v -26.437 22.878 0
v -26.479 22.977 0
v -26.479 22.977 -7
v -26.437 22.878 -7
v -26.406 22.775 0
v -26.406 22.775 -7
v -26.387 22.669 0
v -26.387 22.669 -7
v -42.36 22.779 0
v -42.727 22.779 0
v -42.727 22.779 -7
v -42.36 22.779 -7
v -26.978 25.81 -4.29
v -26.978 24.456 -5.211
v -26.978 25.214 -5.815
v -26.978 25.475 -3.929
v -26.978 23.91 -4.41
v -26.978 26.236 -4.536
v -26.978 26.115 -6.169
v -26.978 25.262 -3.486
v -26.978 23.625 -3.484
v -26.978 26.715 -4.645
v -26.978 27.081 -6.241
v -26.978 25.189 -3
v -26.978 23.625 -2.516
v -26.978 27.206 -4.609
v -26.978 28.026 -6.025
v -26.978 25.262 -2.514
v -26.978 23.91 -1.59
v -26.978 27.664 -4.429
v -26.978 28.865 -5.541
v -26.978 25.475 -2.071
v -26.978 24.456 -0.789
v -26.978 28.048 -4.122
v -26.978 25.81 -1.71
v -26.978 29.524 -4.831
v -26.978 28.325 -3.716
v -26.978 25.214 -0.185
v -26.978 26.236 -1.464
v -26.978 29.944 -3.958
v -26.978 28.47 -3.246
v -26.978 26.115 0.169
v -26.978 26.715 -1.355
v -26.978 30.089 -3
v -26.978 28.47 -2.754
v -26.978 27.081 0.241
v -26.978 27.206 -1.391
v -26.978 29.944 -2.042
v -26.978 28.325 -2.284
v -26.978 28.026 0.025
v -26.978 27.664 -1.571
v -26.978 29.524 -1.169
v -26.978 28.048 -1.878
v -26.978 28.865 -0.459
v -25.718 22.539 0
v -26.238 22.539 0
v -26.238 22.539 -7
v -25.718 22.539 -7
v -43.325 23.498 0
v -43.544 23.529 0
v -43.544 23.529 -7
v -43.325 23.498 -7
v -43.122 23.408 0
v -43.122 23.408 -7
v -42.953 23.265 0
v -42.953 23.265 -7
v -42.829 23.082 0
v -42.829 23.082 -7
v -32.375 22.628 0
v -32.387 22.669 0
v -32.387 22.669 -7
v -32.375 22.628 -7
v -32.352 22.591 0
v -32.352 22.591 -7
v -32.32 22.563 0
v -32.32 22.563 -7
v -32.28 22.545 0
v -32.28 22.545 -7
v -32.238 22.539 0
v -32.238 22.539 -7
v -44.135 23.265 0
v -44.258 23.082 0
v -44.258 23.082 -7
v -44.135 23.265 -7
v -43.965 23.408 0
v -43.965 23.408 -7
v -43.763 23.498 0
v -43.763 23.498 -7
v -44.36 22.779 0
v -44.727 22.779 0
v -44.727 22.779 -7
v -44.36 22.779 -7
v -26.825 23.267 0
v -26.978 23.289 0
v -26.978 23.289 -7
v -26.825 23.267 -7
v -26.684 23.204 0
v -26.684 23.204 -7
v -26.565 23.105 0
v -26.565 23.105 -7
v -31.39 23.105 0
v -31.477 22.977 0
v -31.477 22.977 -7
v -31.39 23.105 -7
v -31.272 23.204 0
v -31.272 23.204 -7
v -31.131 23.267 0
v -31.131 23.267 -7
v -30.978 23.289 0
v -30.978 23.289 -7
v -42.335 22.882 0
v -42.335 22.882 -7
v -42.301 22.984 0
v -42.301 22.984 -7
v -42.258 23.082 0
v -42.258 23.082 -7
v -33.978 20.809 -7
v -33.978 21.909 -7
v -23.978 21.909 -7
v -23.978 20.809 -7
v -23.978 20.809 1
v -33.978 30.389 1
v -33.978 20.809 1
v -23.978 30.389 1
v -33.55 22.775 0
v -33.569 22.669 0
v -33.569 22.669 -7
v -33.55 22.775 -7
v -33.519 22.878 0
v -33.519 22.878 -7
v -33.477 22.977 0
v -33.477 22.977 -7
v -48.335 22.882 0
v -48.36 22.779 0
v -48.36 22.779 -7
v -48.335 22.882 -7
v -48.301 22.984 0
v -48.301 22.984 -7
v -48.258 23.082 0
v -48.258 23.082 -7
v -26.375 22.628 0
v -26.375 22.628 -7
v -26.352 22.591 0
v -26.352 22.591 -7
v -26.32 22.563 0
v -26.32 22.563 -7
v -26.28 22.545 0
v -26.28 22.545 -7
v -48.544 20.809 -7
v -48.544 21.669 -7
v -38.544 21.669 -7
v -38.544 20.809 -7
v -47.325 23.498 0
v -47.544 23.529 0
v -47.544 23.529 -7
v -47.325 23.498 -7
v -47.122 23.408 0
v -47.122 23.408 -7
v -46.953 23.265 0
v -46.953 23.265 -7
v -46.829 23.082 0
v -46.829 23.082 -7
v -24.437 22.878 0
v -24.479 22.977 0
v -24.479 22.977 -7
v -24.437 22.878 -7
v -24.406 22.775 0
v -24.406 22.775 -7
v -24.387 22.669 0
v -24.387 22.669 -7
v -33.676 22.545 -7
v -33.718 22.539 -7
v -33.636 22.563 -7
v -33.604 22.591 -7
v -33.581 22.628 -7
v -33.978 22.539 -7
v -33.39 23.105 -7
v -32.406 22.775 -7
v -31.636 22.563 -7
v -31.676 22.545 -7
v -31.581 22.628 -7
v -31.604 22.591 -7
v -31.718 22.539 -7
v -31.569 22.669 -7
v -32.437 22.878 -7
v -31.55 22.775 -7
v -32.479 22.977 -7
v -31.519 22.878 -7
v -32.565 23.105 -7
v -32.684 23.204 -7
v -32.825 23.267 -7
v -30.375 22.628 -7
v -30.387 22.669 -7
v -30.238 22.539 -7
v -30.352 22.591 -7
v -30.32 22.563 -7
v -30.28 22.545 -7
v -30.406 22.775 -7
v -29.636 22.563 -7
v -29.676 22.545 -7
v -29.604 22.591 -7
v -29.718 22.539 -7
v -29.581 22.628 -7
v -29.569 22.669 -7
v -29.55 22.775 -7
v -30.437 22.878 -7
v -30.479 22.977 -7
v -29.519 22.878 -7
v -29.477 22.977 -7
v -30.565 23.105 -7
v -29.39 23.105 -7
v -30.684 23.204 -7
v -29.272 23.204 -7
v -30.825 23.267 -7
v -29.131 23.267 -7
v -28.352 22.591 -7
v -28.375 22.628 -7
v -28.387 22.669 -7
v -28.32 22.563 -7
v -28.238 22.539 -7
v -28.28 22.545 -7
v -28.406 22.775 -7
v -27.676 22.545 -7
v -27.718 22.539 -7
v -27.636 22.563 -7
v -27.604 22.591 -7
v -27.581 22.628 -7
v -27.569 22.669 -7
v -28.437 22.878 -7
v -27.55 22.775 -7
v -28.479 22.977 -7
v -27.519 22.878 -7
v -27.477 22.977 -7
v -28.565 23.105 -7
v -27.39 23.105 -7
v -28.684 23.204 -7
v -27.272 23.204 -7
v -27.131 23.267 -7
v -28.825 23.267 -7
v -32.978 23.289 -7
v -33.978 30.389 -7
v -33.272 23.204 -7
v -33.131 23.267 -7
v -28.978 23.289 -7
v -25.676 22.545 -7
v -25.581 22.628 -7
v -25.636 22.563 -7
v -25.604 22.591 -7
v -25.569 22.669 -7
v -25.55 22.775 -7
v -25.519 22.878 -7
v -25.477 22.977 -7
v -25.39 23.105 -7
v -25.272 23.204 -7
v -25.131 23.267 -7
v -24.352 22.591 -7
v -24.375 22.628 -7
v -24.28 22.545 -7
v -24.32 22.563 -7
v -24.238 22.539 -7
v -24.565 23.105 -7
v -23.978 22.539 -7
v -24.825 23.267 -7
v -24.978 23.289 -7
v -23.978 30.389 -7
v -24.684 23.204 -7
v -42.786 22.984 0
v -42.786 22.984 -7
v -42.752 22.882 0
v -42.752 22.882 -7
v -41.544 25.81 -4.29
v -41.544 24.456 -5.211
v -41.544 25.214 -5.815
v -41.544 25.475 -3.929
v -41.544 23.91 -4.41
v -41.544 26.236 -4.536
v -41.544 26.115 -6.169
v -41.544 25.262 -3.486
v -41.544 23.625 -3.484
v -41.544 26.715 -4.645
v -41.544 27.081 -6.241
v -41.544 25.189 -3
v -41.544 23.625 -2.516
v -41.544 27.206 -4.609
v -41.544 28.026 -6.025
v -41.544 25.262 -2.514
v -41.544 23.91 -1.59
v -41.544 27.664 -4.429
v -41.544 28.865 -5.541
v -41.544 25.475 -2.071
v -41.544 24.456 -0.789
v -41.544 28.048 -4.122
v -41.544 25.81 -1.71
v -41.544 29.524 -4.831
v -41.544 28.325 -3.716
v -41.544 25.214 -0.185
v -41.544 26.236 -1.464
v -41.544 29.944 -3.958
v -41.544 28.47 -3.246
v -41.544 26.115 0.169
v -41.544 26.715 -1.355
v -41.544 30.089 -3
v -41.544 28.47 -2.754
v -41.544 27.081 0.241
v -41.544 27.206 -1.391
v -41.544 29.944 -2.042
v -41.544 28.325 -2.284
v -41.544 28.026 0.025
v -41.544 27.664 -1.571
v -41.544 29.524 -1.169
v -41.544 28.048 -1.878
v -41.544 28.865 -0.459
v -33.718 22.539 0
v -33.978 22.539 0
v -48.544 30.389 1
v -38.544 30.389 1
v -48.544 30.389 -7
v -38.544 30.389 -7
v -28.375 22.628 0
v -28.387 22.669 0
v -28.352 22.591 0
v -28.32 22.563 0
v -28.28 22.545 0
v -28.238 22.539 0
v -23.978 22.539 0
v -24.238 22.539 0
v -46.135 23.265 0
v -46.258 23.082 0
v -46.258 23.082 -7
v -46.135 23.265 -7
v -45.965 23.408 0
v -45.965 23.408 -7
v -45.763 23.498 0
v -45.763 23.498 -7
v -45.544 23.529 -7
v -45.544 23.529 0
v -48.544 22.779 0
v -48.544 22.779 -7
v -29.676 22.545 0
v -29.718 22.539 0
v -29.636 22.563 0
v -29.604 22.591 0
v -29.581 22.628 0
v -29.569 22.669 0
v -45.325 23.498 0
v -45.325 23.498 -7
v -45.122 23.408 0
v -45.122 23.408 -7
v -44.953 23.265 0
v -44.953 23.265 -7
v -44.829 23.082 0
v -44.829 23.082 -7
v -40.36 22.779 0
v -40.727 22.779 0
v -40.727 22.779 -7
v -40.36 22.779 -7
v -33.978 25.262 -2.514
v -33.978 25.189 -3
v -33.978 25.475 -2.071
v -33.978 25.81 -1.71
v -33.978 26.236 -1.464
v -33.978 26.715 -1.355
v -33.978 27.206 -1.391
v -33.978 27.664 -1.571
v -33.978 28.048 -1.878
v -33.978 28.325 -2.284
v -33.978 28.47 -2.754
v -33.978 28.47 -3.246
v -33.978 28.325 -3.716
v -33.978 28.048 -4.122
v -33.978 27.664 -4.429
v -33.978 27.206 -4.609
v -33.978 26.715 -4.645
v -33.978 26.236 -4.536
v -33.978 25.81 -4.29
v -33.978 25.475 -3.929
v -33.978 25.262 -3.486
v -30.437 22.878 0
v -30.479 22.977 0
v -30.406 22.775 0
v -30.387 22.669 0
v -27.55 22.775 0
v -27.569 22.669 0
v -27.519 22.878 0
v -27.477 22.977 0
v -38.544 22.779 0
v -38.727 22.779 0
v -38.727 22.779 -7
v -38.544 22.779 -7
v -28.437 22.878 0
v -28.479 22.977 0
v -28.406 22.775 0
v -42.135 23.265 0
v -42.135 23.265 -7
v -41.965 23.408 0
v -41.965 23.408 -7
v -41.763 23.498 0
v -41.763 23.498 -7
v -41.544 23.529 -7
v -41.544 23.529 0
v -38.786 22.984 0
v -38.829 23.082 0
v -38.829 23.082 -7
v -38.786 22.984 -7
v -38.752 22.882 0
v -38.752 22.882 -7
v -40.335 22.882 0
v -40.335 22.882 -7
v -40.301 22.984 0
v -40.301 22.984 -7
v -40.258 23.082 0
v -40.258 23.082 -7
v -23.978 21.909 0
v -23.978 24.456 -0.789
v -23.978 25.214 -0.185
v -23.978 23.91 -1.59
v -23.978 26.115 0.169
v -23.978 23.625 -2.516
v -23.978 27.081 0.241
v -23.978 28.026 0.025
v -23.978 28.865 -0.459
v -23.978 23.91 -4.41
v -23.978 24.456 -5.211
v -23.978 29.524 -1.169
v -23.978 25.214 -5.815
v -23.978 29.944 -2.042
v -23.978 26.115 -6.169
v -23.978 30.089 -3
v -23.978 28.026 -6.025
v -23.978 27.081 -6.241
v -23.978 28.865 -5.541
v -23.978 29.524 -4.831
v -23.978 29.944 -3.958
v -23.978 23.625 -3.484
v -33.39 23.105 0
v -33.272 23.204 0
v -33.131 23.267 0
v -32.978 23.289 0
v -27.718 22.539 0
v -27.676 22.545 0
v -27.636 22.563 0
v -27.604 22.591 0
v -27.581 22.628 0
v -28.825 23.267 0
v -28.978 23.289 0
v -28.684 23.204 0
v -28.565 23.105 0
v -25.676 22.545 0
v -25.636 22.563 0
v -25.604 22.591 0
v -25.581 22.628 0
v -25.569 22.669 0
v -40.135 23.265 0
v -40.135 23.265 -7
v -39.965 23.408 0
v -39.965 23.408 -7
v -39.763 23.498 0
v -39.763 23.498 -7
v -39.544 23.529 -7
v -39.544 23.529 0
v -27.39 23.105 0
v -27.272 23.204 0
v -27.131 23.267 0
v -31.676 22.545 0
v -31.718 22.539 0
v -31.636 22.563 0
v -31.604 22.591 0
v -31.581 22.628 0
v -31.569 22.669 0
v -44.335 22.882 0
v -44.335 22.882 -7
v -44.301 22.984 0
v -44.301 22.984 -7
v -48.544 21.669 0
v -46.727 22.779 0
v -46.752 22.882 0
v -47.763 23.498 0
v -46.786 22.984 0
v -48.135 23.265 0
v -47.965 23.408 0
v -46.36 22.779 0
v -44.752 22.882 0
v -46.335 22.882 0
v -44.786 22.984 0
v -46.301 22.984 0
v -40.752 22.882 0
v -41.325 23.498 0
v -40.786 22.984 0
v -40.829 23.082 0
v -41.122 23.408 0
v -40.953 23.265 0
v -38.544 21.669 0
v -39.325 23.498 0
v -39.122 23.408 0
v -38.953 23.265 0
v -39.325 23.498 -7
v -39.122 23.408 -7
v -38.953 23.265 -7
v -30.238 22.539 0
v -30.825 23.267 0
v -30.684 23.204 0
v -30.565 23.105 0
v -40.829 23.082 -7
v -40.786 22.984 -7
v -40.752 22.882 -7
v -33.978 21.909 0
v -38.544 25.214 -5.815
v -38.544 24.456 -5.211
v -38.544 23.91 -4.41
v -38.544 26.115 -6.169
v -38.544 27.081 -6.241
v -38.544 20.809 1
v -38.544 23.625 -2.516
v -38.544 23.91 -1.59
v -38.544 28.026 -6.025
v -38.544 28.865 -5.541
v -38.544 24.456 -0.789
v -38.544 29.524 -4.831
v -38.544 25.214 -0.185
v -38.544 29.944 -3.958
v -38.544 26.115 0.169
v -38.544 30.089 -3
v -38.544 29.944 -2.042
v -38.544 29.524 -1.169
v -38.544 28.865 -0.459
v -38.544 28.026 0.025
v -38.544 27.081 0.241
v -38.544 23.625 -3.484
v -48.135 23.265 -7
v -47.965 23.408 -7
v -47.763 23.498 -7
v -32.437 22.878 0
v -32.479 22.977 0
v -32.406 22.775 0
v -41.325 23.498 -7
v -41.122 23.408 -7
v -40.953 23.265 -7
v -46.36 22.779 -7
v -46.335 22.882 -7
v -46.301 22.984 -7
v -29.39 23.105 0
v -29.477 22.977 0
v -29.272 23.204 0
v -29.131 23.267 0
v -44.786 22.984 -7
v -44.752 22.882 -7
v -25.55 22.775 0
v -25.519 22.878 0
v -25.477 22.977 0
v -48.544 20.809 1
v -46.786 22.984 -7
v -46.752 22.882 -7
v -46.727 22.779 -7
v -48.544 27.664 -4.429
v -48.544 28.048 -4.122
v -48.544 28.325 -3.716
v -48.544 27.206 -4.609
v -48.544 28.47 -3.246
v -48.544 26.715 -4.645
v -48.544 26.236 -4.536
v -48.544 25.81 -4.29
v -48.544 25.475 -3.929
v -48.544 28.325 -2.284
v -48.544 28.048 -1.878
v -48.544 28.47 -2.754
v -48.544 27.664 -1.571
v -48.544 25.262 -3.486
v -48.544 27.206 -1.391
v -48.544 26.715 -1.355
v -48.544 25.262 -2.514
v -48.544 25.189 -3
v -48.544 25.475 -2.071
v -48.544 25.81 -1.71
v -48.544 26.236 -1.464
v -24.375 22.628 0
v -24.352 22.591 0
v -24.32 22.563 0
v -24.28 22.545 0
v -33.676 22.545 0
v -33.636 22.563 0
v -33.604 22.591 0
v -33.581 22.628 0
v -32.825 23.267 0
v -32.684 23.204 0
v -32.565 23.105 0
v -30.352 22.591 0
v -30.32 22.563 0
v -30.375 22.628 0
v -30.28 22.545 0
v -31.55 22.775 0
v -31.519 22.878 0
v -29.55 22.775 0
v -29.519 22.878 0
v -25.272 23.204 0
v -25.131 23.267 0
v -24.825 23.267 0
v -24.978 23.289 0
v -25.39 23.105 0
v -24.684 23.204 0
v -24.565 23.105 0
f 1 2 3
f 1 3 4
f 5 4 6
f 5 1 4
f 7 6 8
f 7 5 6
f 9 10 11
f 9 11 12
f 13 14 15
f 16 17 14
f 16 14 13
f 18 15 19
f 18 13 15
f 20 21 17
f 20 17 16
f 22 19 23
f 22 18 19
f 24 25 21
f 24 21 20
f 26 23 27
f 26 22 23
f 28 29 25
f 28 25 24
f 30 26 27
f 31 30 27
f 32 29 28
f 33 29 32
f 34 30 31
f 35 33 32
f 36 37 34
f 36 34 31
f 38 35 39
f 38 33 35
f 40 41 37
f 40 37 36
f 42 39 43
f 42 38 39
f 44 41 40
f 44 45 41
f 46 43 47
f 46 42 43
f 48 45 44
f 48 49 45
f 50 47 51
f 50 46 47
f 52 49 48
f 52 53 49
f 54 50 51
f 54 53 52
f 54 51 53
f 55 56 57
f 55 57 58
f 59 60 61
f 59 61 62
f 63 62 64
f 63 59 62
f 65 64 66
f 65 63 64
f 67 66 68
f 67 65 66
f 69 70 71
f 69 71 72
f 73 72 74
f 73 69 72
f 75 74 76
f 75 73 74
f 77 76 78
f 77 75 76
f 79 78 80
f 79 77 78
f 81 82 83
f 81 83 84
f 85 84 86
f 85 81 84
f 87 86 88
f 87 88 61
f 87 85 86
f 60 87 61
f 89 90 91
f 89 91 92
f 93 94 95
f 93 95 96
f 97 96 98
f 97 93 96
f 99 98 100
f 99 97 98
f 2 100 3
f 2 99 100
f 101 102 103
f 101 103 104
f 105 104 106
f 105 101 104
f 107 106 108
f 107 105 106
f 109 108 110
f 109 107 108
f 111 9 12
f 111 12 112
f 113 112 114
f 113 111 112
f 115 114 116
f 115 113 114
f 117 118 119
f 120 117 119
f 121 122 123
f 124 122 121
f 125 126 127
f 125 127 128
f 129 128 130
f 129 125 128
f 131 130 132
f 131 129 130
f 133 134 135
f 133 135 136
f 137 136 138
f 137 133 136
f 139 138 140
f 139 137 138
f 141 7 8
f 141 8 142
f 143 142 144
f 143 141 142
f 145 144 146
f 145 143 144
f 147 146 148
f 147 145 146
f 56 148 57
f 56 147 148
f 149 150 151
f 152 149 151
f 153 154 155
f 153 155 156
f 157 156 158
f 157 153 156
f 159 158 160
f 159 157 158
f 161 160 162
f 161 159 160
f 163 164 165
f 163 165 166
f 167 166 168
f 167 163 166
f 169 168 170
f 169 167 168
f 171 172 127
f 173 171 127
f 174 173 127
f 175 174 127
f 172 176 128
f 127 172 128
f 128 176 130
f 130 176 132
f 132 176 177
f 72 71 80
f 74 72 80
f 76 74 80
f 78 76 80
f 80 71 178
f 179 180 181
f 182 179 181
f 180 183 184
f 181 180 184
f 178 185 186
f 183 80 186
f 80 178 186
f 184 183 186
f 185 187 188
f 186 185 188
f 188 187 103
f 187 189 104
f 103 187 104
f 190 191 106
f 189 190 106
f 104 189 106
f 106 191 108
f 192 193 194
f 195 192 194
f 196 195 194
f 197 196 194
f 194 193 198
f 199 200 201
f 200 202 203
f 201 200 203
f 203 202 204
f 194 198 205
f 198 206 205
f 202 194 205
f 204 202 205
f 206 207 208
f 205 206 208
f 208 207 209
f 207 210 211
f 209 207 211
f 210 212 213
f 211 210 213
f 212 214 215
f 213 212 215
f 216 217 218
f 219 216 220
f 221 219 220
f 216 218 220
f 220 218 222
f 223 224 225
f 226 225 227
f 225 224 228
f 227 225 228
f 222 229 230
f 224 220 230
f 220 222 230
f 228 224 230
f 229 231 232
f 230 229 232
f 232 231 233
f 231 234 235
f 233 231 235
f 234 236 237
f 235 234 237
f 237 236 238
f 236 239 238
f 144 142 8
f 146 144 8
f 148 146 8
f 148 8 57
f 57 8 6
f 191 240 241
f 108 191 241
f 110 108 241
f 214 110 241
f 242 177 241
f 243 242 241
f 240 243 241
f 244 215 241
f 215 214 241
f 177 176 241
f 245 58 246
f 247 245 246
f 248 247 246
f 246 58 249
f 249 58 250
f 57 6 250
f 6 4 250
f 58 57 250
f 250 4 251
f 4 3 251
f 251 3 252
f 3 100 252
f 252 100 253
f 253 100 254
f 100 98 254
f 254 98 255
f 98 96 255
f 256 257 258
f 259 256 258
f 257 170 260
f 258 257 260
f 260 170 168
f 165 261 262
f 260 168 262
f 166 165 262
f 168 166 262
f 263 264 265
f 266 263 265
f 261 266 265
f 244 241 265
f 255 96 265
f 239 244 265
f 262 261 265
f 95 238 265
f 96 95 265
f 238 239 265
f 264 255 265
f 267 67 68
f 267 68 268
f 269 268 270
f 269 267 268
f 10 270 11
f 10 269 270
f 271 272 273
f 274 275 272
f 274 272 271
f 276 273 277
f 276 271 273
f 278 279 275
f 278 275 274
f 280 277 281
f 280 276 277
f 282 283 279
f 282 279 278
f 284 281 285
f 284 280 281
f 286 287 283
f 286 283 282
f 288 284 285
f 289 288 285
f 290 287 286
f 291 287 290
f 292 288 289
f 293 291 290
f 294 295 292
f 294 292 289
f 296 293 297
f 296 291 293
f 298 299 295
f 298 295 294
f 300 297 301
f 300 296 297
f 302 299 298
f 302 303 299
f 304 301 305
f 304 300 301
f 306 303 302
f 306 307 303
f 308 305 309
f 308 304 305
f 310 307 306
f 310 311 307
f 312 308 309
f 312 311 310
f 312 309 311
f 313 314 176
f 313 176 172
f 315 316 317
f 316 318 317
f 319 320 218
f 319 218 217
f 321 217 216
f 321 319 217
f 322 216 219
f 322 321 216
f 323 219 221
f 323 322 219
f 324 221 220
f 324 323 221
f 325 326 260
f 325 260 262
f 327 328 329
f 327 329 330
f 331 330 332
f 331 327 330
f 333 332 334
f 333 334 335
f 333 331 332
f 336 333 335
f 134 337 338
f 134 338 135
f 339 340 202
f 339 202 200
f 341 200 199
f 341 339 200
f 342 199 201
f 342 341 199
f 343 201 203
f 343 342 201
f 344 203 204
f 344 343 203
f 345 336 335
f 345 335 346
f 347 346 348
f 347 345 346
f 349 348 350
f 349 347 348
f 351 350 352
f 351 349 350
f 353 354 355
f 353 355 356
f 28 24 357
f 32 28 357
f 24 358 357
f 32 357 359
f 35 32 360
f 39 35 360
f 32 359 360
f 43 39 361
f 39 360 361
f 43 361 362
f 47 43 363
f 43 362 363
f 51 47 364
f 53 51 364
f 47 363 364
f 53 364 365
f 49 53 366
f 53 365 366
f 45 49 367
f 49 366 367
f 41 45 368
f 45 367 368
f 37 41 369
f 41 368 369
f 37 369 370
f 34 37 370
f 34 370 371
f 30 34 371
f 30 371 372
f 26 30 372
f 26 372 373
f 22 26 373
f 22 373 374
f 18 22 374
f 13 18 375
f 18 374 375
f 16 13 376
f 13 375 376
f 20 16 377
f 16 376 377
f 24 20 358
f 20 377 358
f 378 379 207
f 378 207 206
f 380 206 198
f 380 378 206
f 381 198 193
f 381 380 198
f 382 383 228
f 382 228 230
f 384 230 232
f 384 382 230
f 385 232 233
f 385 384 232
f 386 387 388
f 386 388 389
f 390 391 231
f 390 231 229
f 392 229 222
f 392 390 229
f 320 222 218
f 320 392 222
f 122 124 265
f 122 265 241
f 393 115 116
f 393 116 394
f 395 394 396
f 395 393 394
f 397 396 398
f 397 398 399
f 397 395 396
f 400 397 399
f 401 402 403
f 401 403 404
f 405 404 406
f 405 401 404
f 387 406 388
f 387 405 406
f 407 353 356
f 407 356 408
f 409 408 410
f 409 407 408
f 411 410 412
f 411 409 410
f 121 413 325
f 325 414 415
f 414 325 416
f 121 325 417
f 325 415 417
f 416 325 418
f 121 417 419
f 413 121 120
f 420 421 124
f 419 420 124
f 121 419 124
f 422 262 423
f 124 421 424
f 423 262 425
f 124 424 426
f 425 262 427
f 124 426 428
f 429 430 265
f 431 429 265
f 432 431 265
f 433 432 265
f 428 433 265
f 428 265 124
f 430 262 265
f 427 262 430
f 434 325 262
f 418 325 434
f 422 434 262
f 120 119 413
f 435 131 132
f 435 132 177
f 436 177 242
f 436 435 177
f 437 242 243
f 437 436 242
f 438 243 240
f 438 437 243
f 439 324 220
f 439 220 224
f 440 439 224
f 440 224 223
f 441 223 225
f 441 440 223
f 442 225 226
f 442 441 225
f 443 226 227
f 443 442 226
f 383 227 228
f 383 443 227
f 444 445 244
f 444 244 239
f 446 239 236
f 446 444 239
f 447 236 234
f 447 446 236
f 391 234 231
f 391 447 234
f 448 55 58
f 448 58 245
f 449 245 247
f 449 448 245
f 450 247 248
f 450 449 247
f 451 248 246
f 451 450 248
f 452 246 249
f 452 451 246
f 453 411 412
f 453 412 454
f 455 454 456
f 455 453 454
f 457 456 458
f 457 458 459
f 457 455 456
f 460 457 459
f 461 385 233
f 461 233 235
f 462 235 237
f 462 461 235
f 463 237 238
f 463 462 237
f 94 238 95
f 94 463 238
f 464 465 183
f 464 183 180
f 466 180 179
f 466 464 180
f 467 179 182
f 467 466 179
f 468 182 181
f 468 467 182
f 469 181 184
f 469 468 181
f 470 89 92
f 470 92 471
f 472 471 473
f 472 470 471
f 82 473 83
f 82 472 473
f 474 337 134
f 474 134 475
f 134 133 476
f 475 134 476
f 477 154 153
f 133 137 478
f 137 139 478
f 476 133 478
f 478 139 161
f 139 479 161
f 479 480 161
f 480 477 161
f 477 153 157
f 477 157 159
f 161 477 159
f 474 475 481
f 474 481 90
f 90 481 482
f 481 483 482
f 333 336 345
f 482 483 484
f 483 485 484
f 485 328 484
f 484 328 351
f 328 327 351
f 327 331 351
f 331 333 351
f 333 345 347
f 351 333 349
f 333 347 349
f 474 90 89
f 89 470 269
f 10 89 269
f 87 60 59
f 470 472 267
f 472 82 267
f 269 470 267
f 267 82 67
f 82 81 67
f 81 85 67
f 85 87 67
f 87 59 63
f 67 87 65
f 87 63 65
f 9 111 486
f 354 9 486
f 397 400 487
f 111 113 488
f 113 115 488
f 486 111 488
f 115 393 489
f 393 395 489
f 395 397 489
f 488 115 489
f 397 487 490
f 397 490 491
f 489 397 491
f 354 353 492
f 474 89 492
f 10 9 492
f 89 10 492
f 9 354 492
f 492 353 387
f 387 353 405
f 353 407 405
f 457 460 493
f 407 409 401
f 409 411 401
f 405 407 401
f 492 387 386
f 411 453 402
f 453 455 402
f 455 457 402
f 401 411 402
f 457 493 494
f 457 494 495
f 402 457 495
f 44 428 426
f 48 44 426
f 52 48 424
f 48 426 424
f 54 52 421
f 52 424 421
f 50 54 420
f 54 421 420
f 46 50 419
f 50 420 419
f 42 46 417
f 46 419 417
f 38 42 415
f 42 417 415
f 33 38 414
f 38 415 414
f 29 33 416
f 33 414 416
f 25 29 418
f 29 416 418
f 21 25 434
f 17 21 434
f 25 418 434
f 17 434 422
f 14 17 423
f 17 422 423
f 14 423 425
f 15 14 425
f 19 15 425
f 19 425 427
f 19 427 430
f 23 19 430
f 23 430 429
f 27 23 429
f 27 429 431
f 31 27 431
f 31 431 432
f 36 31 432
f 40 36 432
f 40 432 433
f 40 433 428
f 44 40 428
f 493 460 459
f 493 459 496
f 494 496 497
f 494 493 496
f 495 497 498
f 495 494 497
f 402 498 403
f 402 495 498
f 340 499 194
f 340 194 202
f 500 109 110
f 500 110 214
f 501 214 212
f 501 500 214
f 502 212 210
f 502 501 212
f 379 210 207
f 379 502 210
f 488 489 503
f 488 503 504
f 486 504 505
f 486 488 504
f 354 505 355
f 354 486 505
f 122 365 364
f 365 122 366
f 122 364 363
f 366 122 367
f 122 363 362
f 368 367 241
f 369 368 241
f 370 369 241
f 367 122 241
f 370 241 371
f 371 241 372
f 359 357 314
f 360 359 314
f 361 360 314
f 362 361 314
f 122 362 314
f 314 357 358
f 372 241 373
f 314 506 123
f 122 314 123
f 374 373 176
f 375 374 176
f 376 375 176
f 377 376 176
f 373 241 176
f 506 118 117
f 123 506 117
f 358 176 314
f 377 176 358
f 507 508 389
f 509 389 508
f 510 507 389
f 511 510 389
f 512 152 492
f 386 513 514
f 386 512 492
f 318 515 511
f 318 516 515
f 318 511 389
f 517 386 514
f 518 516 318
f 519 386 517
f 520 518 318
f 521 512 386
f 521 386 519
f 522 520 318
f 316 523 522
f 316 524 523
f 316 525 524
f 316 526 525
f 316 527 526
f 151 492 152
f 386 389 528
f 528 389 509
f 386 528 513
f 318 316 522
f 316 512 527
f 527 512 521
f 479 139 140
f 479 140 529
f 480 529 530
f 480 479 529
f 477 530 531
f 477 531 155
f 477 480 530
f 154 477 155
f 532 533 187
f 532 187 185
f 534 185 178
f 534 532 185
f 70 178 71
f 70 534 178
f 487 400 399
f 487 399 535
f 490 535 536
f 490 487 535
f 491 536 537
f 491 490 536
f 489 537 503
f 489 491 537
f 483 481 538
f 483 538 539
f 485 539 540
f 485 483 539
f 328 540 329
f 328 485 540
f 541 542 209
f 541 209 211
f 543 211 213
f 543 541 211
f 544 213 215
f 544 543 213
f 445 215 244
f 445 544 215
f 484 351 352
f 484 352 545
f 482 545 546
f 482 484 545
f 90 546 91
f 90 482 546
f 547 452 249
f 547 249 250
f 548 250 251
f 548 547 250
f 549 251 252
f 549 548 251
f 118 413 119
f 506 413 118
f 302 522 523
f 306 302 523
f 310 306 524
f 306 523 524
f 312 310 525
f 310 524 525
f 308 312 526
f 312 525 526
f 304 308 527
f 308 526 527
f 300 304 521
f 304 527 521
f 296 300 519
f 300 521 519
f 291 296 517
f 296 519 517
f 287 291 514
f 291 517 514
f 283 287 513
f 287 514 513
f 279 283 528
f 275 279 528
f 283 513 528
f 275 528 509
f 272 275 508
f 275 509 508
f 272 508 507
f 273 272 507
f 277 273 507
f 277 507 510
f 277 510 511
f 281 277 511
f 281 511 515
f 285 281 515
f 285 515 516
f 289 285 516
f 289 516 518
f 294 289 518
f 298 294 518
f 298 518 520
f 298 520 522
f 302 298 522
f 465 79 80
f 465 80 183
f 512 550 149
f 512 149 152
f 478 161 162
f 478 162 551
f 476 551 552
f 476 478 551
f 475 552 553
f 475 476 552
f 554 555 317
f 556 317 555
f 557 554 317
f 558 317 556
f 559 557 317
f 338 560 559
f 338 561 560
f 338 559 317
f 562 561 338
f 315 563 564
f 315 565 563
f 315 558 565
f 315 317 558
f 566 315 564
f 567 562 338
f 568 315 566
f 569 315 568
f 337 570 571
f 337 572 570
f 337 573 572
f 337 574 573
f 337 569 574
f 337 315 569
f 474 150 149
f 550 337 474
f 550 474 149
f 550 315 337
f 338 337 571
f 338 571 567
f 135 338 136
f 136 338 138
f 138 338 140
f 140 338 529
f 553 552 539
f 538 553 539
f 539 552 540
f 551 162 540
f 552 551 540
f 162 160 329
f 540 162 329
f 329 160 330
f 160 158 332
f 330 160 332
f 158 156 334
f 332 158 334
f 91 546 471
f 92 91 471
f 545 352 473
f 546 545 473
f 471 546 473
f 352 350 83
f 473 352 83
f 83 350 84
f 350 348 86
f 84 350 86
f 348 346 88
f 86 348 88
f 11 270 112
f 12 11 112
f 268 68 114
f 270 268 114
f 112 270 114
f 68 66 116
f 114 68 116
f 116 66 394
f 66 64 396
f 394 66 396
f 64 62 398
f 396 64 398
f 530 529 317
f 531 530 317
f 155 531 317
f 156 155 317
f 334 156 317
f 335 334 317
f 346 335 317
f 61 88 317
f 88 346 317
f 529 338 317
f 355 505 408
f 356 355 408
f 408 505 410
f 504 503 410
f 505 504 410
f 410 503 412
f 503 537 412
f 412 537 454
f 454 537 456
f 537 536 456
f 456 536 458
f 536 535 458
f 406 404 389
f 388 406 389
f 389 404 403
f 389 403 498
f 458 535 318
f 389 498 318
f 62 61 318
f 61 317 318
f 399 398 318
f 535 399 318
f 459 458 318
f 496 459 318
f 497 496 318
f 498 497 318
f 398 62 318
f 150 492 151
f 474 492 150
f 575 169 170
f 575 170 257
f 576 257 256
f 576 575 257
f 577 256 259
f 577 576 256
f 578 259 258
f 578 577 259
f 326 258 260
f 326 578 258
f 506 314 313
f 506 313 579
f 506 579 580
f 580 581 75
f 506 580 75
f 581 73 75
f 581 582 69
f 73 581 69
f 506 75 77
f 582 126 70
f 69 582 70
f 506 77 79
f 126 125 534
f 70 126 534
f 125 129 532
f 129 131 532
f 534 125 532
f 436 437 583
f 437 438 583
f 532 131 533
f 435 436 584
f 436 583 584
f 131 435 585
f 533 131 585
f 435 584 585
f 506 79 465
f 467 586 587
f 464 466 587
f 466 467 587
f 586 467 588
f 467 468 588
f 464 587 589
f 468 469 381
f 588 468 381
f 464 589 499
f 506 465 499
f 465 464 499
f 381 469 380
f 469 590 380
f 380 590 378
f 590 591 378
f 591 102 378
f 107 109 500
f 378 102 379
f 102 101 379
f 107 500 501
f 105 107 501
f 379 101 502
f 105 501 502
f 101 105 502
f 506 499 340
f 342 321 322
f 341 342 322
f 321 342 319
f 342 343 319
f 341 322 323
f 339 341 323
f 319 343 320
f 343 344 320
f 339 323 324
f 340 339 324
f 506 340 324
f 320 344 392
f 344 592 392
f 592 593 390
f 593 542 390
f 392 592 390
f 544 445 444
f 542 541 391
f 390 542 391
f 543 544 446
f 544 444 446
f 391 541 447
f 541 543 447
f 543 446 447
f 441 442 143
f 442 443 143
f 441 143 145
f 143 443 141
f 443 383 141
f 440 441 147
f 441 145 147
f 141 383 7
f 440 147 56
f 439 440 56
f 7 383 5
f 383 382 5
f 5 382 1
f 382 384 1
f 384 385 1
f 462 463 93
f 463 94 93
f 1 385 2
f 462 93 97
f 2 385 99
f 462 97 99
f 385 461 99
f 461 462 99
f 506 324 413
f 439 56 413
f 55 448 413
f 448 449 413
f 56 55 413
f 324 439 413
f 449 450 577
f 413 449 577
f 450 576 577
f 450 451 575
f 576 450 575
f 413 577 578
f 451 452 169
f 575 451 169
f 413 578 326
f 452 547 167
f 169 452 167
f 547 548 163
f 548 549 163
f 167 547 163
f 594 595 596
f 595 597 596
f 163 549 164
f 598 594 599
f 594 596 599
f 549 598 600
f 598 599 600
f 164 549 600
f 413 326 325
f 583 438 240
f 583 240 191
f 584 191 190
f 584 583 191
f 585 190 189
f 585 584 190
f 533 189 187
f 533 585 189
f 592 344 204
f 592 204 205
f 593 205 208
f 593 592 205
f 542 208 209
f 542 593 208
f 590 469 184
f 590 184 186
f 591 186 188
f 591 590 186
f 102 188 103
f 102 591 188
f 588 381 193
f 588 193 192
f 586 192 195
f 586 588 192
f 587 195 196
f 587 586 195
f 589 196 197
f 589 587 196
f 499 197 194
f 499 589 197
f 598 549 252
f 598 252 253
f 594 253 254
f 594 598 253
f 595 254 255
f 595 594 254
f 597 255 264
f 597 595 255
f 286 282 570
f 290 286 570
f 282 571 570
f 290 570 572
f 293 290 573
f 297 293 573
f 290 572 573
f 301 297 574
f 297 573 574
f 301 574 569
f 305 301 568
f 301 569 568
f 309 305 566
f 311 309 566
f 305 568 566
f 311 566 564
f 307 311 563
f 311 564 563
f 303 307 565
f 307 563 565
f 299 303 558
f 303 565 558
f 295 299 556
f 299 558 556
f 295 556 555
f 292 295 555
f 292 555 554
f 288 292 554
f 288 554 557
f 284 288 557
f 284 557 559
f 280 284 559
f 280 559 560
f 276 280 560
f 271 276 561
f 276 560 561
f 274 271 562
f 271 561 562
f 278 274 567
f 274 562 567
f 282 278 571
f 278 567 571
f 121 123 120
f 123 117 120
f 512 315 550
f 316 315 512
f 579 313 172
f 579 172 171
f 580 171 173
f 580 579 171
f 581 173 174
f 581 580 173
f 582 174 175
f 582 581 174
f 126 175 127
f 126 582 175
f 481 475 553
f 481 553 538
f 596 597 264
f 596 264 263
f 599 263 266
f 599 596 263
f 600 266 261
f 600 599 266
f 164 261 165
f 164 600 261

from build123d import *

# Parameters (mm, degrees)
F1_DEPTH       = 1
F2_DEPTH       = 7
F4_D           = 3.3
F4_CBORE_D     = 6.5
F4_CBORE_DEPTH = 3
F6_D           = 3.3
F6_CBORE_D     = 6.5
F6_CBORE_DEPTH = 3


# Not quite as in the source:
# - a feature names something its author has since deleted; it is built from what else it names


with BuildPart() as f1:
    # F0 (on Top) → F1 (new body)
    with BuildSketch(Plane.XY):
        with BuildLine():
            ThreePointArc((-32.9779816215, 23.288556752), (-32.6838322098, 23.2041958107), (-32.479105217, 22.9767589991))
            ThreePointArc((-32.479105217, 22.9767589991), (-32.4203699072, 22.8266189059), (-32.3865247301, 22.6689915346))
            ThreePointArc((-32.3865247301, 22.6689915346), (-32.3367132674, 22.5757853402), (-32.2378061964, 22.538556752))
            Line((-32.2378061964, 22.538556752), (-31.9779816215, 22.538556752))
            Line((-31.9779816215, 22.538556752), (-31.7181570466, 22.538556752))
            ThreePointArc((-31.7181570466, 22.538556752), (-31.6192499756, 22.5757853402), (-31.5694385129, 22.6689915346))
            ThreePointArc((-31.5694385129, 22.6689915346), (-31.5355933359, 22.8266189059), (-31.476858026, 22.9767589991))
            ThreePointArc((-31.476858026, 22.9767589991), (-31.2721310332, 23.2041958107), (-30.9779816215, 23.288556752))
            ThreePointArc((-30.9779816215, 23.288556752), (-30.6838322098, 23.2041958107), (-30.479105217, 22.9767589991))
            ThreePointArc((-30.479105217, 22.9767589991), (-30.4203699072, 22.8266189059), (-30.3865247301, 22.6689915346))
            ThreePointArc((-30.3865247301, 22.6689915346), (-30.3367132674, 22.5757853402), (-30.2378061964, 22.538556752))
            Line((-30.2378061964, 22.538556752), (-29.9779816215, 22.538556752))
            Line((-29.9779816215, 22.538556752), (-29.7181570466, 22.538556752))
            ThreePointArc((-29.7181570466, 22.538556752), (-29.6192499756, 22.5757853402), (-29.5694385129, 22.6689915346))
            ThreePointArc((-29.5694385129, 22.6689915346), (-29.5355933359, 22.8266189059), (-29.476858026, 22.9767589991))
            ThreePointArc((-29.476858026, 22.9767589991), (-29.2721310332, 23.2041958107), (-28.9779816215, 23.288556752))
            ThreePointArc((-28.9779816215, 23.288556752), (-28.6838322098, 23.2041958107), (-28.479105217, 22.9767589991))
            ThreePointArc((-28.479105217, 22.9767589991), (-28.4203699072, 22.8266189059), (-28.3865247301, 22.6689915346))
            ThreePointArc((-28.3865247301, 22.6689915346), (-28.3367132674, 22.5757853402), (-28.2378061964, 22.538556752))
            Line((-28.2378061964, 22.538556752), (-27.9779816215, 22.538556752))
            Line((-27.9779816215, 22.538556752), (-27.7181570466, 22.538556752))
            ThreePointArc((-27.7181570466, 22.538556752), (-27.6192499756, 22.5757853402), (-27.5694385129, 22.6689915346))
            ThreePointArc((-27.5694385129, 22.6689915346), (-27.5355933359, 22.8266189059), (-27.476858026, 22.9767589991))
            ThreePointArc((-27.476858026, 22.9767589991), (-27.2721310332, 23.2041958107), (-26.9779816215, 23.288556752))
            ThreePointArc((-26.9779816215, 23.288556752), (-26.6838322098, 23.2041958107), (-26.479105217, 22.9767589991))
            ThreePointArc((-26.479105217, 22.9767589991), (-26.4203699072, 22.8266189059), (-26.3865247301, 22.6689915346))
            ThreePointArc((-26.3865247301, 22.6689915346), (-26.3367132674, 22.5757853402), (-26.2378061964, 22.538556752))
            Line((-26.2378061964, 22.538556752), (-25.9779816215, 22.538556752))
            Line((-25.9779816215, 22.538556752), (-25.7181570466, 22.538556752))
            ThreePointArc((-25.7181570466, 22.538556752), (-25.6192499756, 22.5757853402), (-25.5694385129, 22.6689915346))
            ThreePointArc((-25.5694385129, 22.6689915346), (-25.5355933359, 22.8266189059), (-25.476858026, 22.9767589991))
            ThreePointArc((-25.476858026, 22.9767589991), (-25.2721310332, 23.2041958107), (-24.9779816215, 23.288556752))
            ThreePointArc((-24.9779816215, 23.288556752), (-24.6838322098, 23.2041958107), (-24.479105217, 22.9767589991))
            ThreePointArc((-24.479105217, 22.9767589991), (-24.4203699072, 22.8266189059), (-24.3865247301, 22.6689915346))
            ThreePointArc((-24.3865247301, 22.6689915346), (-24.3367132674, 22.5757853402), (-24.2378061964, 22.538556752))
            Line((-24.2378061964, 22.538556752), (-23.9779816215, 22.538556752))
            Line((-23.9779816215, 22.538556752), (-23.9779816215, 30.388556752))
            Line((-23.9779816215, 30.388556752), (-33.9779816215, 30.388556752))
            Line((-33.9779816215, 30.388556752), (-33.9779816215, 22.538556752))
            Line((-33.9779816215, 22.538556752), (-33.7181570466, 22.538556752))
            ThreePointArc((-33.7181570466, 22.538556752), (-33.6192499756, 22.5757853402), (-33.5694385129, 22.6689915346))
            ThreePointArc((-33.5694385129, 22.6689915346), (-33.5355933359, 22.8266189059), (-33.476858026, 22.9767589991))
            ThreePointArc((-33.476858026, 22.9767589991), (-33.2721310332, 23.2041958107), (-32.9779816215, 23.288556752))
        make_face()
        with BuildLine():
            ThreePointArc((-32.3865247301, 22.6689915346), (-32.4203699072, 22.8266189059), (-32.479105217, 22.9767589991))
            ThreePointArc((-32.479105217, 22.9767589991), (-32.6838322098, 23.2041958107), (-32.9779816215, 23.288556752))
            ThreePointArc((-32.9779816215, 23.288556752), (-33.2721310332, 23.2041958107), (-33.476858026, 22.9767589991))
            ThreePointArc((-33.476858026, 22.9767589991), (-33.5355933359, 22.8266189059), (-33.5694385129, 22.6689915346))
            ThreePointArc((-33.5694385129, 22.6689915346), (-33.6192499756, 22.5757853402), (-33.7181570466, 22.538556752))
            Line((-33.7181570466, 22.538556752), (-33.9779816215, 22.538556752))
            Line((-33.9779816215, 22.538556752), (-33.9779816215, 21.908556752))
            Line((-33.9779816215, 21.908556752), (-31.9779816215, 21.908556752))
            Line((-31.9779816215, 21.908556752), (-29.9779816215, 21.908556752))
            Line((-29.9779816215, 21.908556752), (-27.9779816215, 21.908556752))
            Line((-27.9779816215, 21.908556752), (-25.9779816215, 21.908556752))
            Line((-25.9779816215, 21.908556752), (-23.9779816215, 21.908556752))
            Line((-23.9779816215, 21.908556752), (-23.9779816215, 22.538556752))
            Line((-23.9779816215, 22.538556752), (-24.2378061964, 22.538556752))
            ThreePointArc((-24.2378061964, 22.538556752), (-24.3367132674, 22.5757853402), (-24.3865247301, 22.6689915346))
            ThreePointArc((-24.3865247301, 22.6689915346), (-24.4203699072, 22.8266189059), (-24.479105217, 22.9767589991))
            ThreePointArc((-24.479105217, 22.9767589991), (-24.6838322098, 23.2041958107), (-24.9779816215, 23.288556752))
            ThreePointArc((-24.9779816215, 23.288556752), (-25.2721310332, 23.2041958107), (-25.476858026, 22.9767589991))
            ThreePointArc((-25.476858026, 22.9767589991), (-25.5355933359, 22.8266189059), (-25.5694385129, 22.6689915346))
            ThreePointArc((-25.5694385129, 22.6689915346), (-25.6192499756, 22.5757853402), (-25.7181570466, 22.538556752))
            Line((-25.7181570466, 22.538556752), (-25.9779816215, 22.538556752))
            Line((-25.9779816215, 22.538556752), (-26.2378061964, 22.538556752))
            ThreePointArc((-26.2378061964, 22.538556752), (-26.3367132674, 22.5757853402), (-26.3865247301, 22.6689915346))
            ThreePointArc((-26.3865247301, 22.6689915346), (-26.4203699072, 22.8266189059), (-26.479105217, 22.9767589991))
            ThreePointArc((-26.479105217, 22.9767589991), (-26.6838322098, 23.2041958107), (-26.9779816215, 23.288556752))
            ThreePointArc((-26.9779816215, 23.288556752), (-27.2721310332, 23.2041958107), (-27.476858026, 22.9767589991))
            ThreePointArc((-27.476858026, 22.9767589991), (-27.5355933359, 22.8266189059), (-27.5694385129, 22.6689915346))
            ThreePointArc((-27.5694385129, 22.6689915346), (-27.6192499756, 22.5757853402), (-27.7181570466, 22.538556752))
            Line((-27.7181570466, 22.538556752), (-27.9779816215, 22.538556752))
            Line((-27.9779816215, 22.538556752), (-28.2378061964, 22.538556752))
            ThreePointArc((-28.2378061964, 22.538556752), (-28.3367132674, 22.5757853402), (-28.3865247301, 22.6689915346))
            ThreePointArc((-28.3865247301, 22.6689915346), (-28.4203699072, 22.8266189059), (-28.479105217, 22.9767589991))
            ThreePointArc((-28.479105217, 22.9767589991), (-28.6838322098, 23.2041958107), (-28.9779816215, 23.288556752))
            ThreePointArc((-28.9779816215, 23.288556752), (-29.2721310332, 23.2041958107), (-29.476858026, 22.9767589991))
            ThreePointArc((-29.476858026, 22.9767589991), (-29.5355933359, 22.8266189059), (-29.5694385129, 22.6689915346))
            ThreePointArc((-29.5694385129, 22.6689915346), (-29.6192499756, 22.5757853402), (-29.7181570466, 22.538556752))
            Line((-29.7181570466, 22.538556752), (-29.9779816215, 22.538556752))
            Line((-29.9779816215, 22.538556752), (-30.2378061964, 22.538556752))
            ThreePointArc((-30.2378061964, 22.538556752), (-30.3367132674, 22.5757853402), (-30.3865247301, 22.6689915346))
            ThreePointArc((-30.3865247301, 22.6689915346), (-30.4203699072, 22.8266189059), (-30.479105217, 22.9767589991))
            ThreePointArc((-30.479105217, 22.9767589991), (-30.6838322098, 23.2041958107), (-30.9779816215, 23.288556752))
            ThreePointArc((-30.9779816215, 23.288556752), (-31.2721310332, 23.2041958107), (-31.476858026, 22.9767589991))
            ThreePointArc((-31.476858026, 22.9767589991), (-31.5355933359, 22.8266189059), (-31.5694385129, 22.6689915346))
            ThreePointArc((-31.5694385129, 22.6689915346), (-31.6192499756, 22.5757853402), (-31.7181570466, 22.538556752))
            Line((-31.7181570466, 22.538556752), (-31.9779816215, 22.538556752))
            Line((-31.9779816215, 22.538556752), (-32.2378061964, 22.538556752))
            ThreePointArc((-32.2378061964, 22.538556752), (-32.3367132674, 22.5757853402), (-32.3865247301, 22.6689915346))
        make_face()
        Polygon((-31.9779816215, 21.908556752), (-33.9779816215, 21.908556752), (-33.9779816215, 20.808556752), (-23.9779816215, 20.808556752), (-23.9779816215, 21.908556752), (-25.9779816215, 21.908556752), (-27.9779816215, 21.908556752), (-29.9779816215, 21.908556752), align=None)
    extrude(amount=F1_DEPTH)

    # F0 (on Top) → F2 (join)
    with BuildSketch(Plane.XY):
        with BuildLine():
            ThreePointArc((-32.9779816215, 23.288556752), (-32.6838322098, 23.2041958107), (-32.479105217, 22.9767589991))
            ThreePointArc((-32.479105217, 22.9767589991), (-32.4203699072, 22.8266189059), (-32.3865247301, 22.6689915346))
            ThreePointArc((-32.3865247301, 22.6689915346), (-32.3367132674, 22.5757853402), (-32.2378061964, 22.538556752))
            Line((-32.2378061964, 22.538556752), (-31.9779816215, 22.538556752))
            Line((-31.9779816215, 22.538556752), (-31.7181570466, 22.538556752))
            ThreePointArc((-31.7181570466, 22.538556752), (-31.6192499756, 22.5757853402), (-31.5694385129, 22.6689915346))
            ThreePointArc((-31.5694385129, 22.6689915346), (-31.5355933359, 22.8266189059), (-31.476858026, 22.9767589991))
            ThreePointArc((-31.476858026, 22.9767589991), (-31.2721310332, 23.2041958107), (-30.9779816215, 23.288556752))
            ThreePointArc((-30.9779816215, 23.288556752), (-30.6838322098, 23.2041958107), (-30.479105217, 22.9767589991))
            ThreePointArc((-30.479105217, 22.9767589991), (-30.4203699072, 22.8266189059), (-30.3865247301, 22.6689915346))
            ThreePointArc((-30.3865247301, 22.6689915346), (-30.3367132674, 22.5757853402), (-30.2378061964, 22.538556752))
            Line((-30.2378061964, 22.538556752), (-29.9779816215, 22.538556752))
            Line((-29.9779816215, 22.538556752), (-29.7181570466, 22.538556752))
            ThreePointArc((-29.7181570466, 22.538556752), (-29.6192499756, 22.5757853402), (-29.5694385129, 22.6689915346))
            ThreePointArc((-29.5694385129, 22.6689915346), (-29.5355933359, 22.8266189059), (-29.476858026, 22.9767589991))
            ThreePointArc((-29.476858026, 22.9767589991), (-29.2721310332, 23.2041958107), (-28.9779816215, 23.288556752))
            ThreePointArc((-28.9779816215, 23.288556752), (-28.6838322098, 23.2041958107), (-28.479105217, 22.9767589991))
            ThreePointArc((-28.479105217, 22.9767589991), (-28.4203699072, 22.8266189059), (-28.3865247301, 22.6689915346))
            ThreePointArc((-28.3865247301, 22.6689915346), (-28.3367132674, 22.5757853402), (-28.2378061964, 22.538556752))
            Line((-28.2378061964, 22.538556752), (-27.9779816215, 22.538556752))
            Line((-27.9779816215, 22.538556752), (-27.7181570466, 22.538556752))
            ThreePointArc((-27.7181570466, 22.538556752), (-27.6192499756, 22.5757853402), (-27.5694385129, 22.6689915346))
            ThreePointArc((-27.5694385129, 22.6689915346), (-27.5355933359, 22.8266189059), (-27.476858026, 22.9767589991))
            ThreePointArc((-27.476858026, 22.9767589991), (-27.2721310332, 23.2041958107), (-26.9779816215, 23.288556752))
            ThreePointArc((-26.9779816215, 23.288556752), (-26.6838322098, 23.2041958107), (-26.479105217, 22.9767589991))
            ThreePointArc((-26.479105217, 22.9767589991), (-26.4203699072, 22.8266189059), (-26.3865247301, 22.6689915346))
            ThreePointArc((-26.3865247301, 22.6689915346), (-26.3367132674, 22.5757853402), (-26.2378061964, 22.538556752))
            Line((-26.2378061964, 22.538556752), (-25.9779816215, 22.538556752))
            Line((-25.9779816215, 22.538556752), (-25.7181570466, 22.538556752))
            ThreePointArc((-25.7181570466, 22.538556752), (-25.6192499756, 22.5757853402), (-25.5694385129, 22.6689915346))
            ThreePointArc((-25.5694385129, 22.6689915346), (-25.5355933359, 22.8266189059), (-25.476858026, 22.9767589991))
            ThreePointArc((-25.476858026, 22.9767589991), (-25.2721310332, 23.2041958107), (-24.9779816215, 23.288556752))
            ThreePointArc((-24.9779816215, 23.288556752), (-24.6838322098, 23.2041958107), (-24.479105217, 22.9767589991))
            ThreePointArc((-24.479105217, 22.9767589991), (-24.4203699072, 22.8266189059), (-24.3865247301, 22.6689915346))
            ThreePointArc((-24.3865247301, 22.6689915346), (-24.3367132674, 22.5757853402), (-24.2378061964, 22.538556752))
            Line((-24.2378061964, 22.538556752), (-23.9779816215, 22.538556752))
            Line((-23.9779816215, 22.538556752), (-23.9779816215, 30.388556752))
            Line((-23.9779816215, 30.388556752), (-33.9779816215, 30.388556752))
            Line((-33.9779816215, 30.388556752), (-33.9779816215, 22.538556752))
            Line((-33.9779816215, 22.538556752), (-33.7181570466, 22.538556752))
            ThreePointArc((-33.7181570466, 22.538556752), (-33.6192499756, 22.5757853402), (-33.5694385129, 22.6689915346))
            ThreePointArc((-33.5694385129, 22.6689915346), (-33.5355933359, 22.8266189059), (-33.476858026, 22.9767589991))
            ThreePointArc((-33.476858026, 22.9767589991), (-33.2721310332, 23.2041958107), (-32.9779816215, 23.288556752))
        make_face()
        Polygon((-31.9779816215, 21.908556752), (-33.9779816215, 21.908556752), (-33.9779816215, 20.808556752), (-23.9779816215, 20.808556752), (-23.9779816215, 21.908556752), (-25.9779816215, 21.908556752), (-27.9779816215, 21.908556752), (-29.9779816215, 21.908556752), align=None)
    extrude(amount=-F2_DEPTH)

    # F4 (through all)
    with Locations(Plane.YZ.offset(-23.9779816215)):
        with Locations((26.838556752, -3)):
            CounterBoreHole(F4_D / 2, F4_CBORE_D / 2, F4_CBORE_DEPTH)


with BuildPart() as f1b:
    # F0 (on Top) → F1, piece 2 (new body)
    with BuildSketch(Plane.XY):
        with BuildLine():
            Line((-48.5437250639, 22.7785576135), (-48.5437250639, 21.668556752))
            Line((-48.5437250639, 21.668556752), (-46.5437250639, 21.668556752))
            Line((-46.5437250639, 21.668556752), (-44.5437250639, 21.668556752))
            Line((-44.5437250639, 21.668556752), (-42.5437250639, 21.668556752))
            Line((-42.5437250639, 21.668556752), (-40.5437250639, 21.668556752))
            Line((-40.5437250639, 21.668556752), (-38.5437250639, 21.668556752))
            Line((-38.5437250639, 21.668556752), (-38.5437250639, 22.7785576135))
            Line((-38.5437250639, 22.7785576135), (-38.7271718496, 22.7785576135))
            ThreePointArc((-38.7271718496, 22.7785576135), (-38.7683162105, 22.9335455669), (-38.8291175479, 23.081927916))
            ThreePointArc((-38.8291175479, 23.081927916), (-39.1223754499, 23.4077161342), (-39.5437250639, 23.5285576135))
            ThreePointArc((-39.5437250639, 23.5285576135), (-39.9650746778, 23.4077161342), (-40.2583325799, 23.081927916))
            ThreePointArc((-40.2583325799, 23.081927916), (-40.3191339173, 22.9335455669), (-40.3602782781, 22.7785576135))
            Line((-40.3602782781, 22.7785576135), (-40.5437250639, 22.7785576135))
            Line((-40.5437250639, 22.7785576135), (-40.7271718496, 22.7785576135))
            ThreePointArc((-40.7271718496, 22.7785576135), (-40.7683162105, 22.9335455669), (-40.8291175479, 23.081927916))
            ThreePointArc((-40.8291175479, 23.081927916), (-41.1223754499, 23.4077161342), (-41.5437250639, 23.5285576135))
            ThreePointArc((-41.5437250639, 23.5285576135), (-41.9650746778, 23.4077161342), (-42.2583325799, 23.081927916))
            ThreePointArc((-42.2583325799, 23.081927916), (-42.3191339173, 22.9335455669), (-42.3602782781, 22.7785576135))
            Line((-42.3602782781, 22.7785576135), (-42.5437250639, 22.7785576135))
            Line((-42.5437250639, 22.7785576135), (-42.7271718496, 22.7785576135))
            ThreePointArc((-42.7271718496, 22.7785576135), (-42.7683162105, 22.9335455669), (-42.8291175479, 23.081927916))
            ThreePointArc((-42.8291175479, 23.081927916), (-43.1223754499, 23.4077161342), (-43.5437250639, 23.5285576135))
            ThreePointArc((-43.5437250639, 23.5285576135), (-43.9650746778, 23.4077161342), (-44.2583325799, 23.081927916))
            ThreePointArc((-44.2583325799, 23.081927916), (-44.3191339173, 22.9335455669), (-44.3602782781, 22.7785576135))
            Line((-44.3602782781, 22.7785576135), (-44.5437250639, 22.7785576135))
            Line((-44.5437250639, 22.7785576135), (-44.7271718496, 22.7785576135))
            ThreePointArc((-44.7271718496, 22.7785576135), (-44.7683162105, 22.9335455669), (-44.8291175479, 23.081927916))
            ThreePointArc((-44.8291175479, 23.081927916), (-45.1223754499, 23.4077161342), (-45.5437250639, 23.5285576135))
            ThreePointArc((-45.5437250639, 23.5285576135), (-45.9650746778, 23.4077161342), (-46.2583325799, 23.081927916))
            ThreePointArc((-46.2583325799, 23.081927916), (-46.3191339173, 22.9335455669), (-46.3602782781, 22.7785576135))
            Line((-46.3602782781, 22.7785576135), (-46.5437250639, 22.7785576135))
            Line((-46.5437250639, 22.7785576135), (-46.7271718496, 22.7785576135))
            ThreePointArc((-46.7271718496, 22.7785576135), (-46.7683162105, 22.9335455669), (-46.8291175479, 23.081927916))
            ThreePointArc((-46.8291175479, 23.081927916), (-47.1223754499, 23.4077161342), (-47.5437250639, 23.5285576135))
            ThreePointArc((-47.5437250639, 23.5285576135), (-47.9650746778, 23.4077161342), (-48.2583325799, 23.081927916))
            ThreePointArc((-48.2583325799, 23.081927916), (-48.3191339173, 22.9335455669), (-48.3602782781, 22.7785576135))
            Line((-48.3602782781, 22.7785576135), (-48.5437250639, 22.7785576135))
        make_face()
        Polygon((-46.5437250639, 21.668556752), (-48.5437250639, 21.668556752), (-48.5437250639, 20.808556752), (-38.5437250639, 20.808556752), (-38.5437250639, 21.668556752), (-40.5437250639, 21.668556752), (-42.5437250639, 21.668556752), (-44.5437250639, 21.668556752), align=None)
        with BuildLine():
            Line((-48.5437250639, 30.388556752), (-48.5437250639, 22.7785576135))
            Line((-48.5437250639, 22.7785576135), (-48.3602782781, 22.7785576135))
            ThreePointArc((-48.3602782781, 22.7785576135), (-48.3191339173, 22.9335455669), (-48.2583325799, 23.081927916))
            ThreePointArc((-48.2583325799, 23.081927916), (-47.9650746778, 23.4077161342), (-47.5437250639, 23.5285576135))
            ThreePointArc((-47.5437250639, 23.5285576135), (-47.1223754499, 23.4077161342), (-46.8291175479, 23.081927916))
            ThreePointArc((-46.8291175479, 23.081927916), (-46.7683162105, 22.9335455669), (-46.7271718496, 22.7785576135))
            Line((-46.7271718496, 22.7785576135), (-46.5437250639, 22.7785576135))
            Line((-46.5437250639, 22.7785576135), (-46.3602782781, 22.7785576135))
            ThreePointArc((-46.3602782781, 22.7785576135), (-46.3191339173, 22.9335455669), (-46.2583325799, 23.081927916))
            ThreePointArc((-46.2583325799, 23.081927916), (-45.9650746778, 23.4077161342), (-45.5437250639, 23.5285576135))
            ThreePointArc((-45.5437250639, 23.5285576135), (-45.1223754499, 23.4077161342), (-44.8291175479, 23.081927916))
            ThreePointArc((-44.8291175479, 23.081927916), (-44.7683162105, 22.9335455669), (-44.7271718496, 22.7785576135))
            Line((-44.7271718496, 22.7785576135), (-44.5437250639, 22.7785576135))
            Line((-44.5437250639, 22.7785576135), (-44.3602782781, 22.7785576135))
            ThreePointArc((-44.3602782781, 22.7785576135), (-44.3191339173, 22.9335455669), (-44.2583325799, 23.081927916))
            ThreePointArc((-44.2583325799, 23.081927916), (-43.9650746778, 23.4077161342), (-43.5437250639, 23.5285576135))
            ThreePointArc((-43.5437250639, 23.5285576135), (-43.1223754499, 23.4077161342), (-42.8291175479, 23.081927916))
            ThreePointArc((-42.8291175479, 23.081927916), (-42.7683162105, 22.9335455669), (-42.7271718496, 22.7785576135))
            Line((-42.7271718496, 22.7785576135), (-42.5437250639, 22.7785576135))
            Line((-42.5437250639, 22.7785576135), (-42.3602782781, 22.7785576135))
            ThreePointArc((-42.3602782781, 22.7785576135), (-42.3191339173, 22.9335455669), (-42.2583325799, 23.081927916))
            ThreePointArc((-42.2583325799, 23.081927916), (-41.9650746778, 23.4077161342), (-41.5437250639, 23.5285576135))
            ThreePointArc((-41.5437250639, 23.5285576135), (-41.1223754499, 23.4077161342), (-40.8291175479, 23.081927916))
            ThreePointArc((-40.8291175479, 23.081927916), (-40.7683162105, 22.9335455669), (-40.7271718496, 22.7785576135))
            Line((-40.7271718496, 22.7785576135), (-40.5437250639, 22.7785576135))
            Line((-40.5437250639, 22.7785576135), (-40.3602782781, 22.7785576135))
            ThreePointArc((-40.3602782781, 22.7785576135), (-40.3191339173, 22.9335455669), (-40.2583325799, 23.081927916))
            ThreePointArc((-40.2583325799, 23.081927916), (-39.9650746778, 23.4077161342), (-39.5437250639, 23.5285576135))
            ThreePointArc((-39.5437250639, 23.5285576135), (-39.1223754499, 23.4077161342), (-38.8291175479, 23.081927916))
            ThreePointArc((-38.8291175479, 23.081927916), (-38.7683162105, 22.9335455669), (-38.7271718496, 22.7785576135))
            Line((-38.7271718496, 22.7785576135), (-38.5437250639, 22.7785576135))
            Line((-38.5437250639, 22.7785576135), (-38.5437250639, 30.388556752))
            Line((-38.5437250639, 30.388556752), (-48.5437250639, 30.388556752))
        make_face()
    extrude(amount=F1_DEPTH)

    # F0 (on Top) → F2, piece 2 (join)
    with BuildSketch(Plane.XY):
        Polygon((-46.5437250639, 21.668556752), (-48.5437250639, 21.668556752), (-48.5437250639, 20.808556752), (-38.5437250639, 20.808556752), (-38.5437250639, 21.668556752), (-40.5437250639, 21.668556752), (-42.5437250639, 21.668556752), (-44.5437250639, 21.668556752), align=None)
        with BuildLine():
            Line((-48.5437250639, 30.388556752), (-48.5437250639, 22.7785576135))
            Line((-48.5437250639, 22.7785576135), (-48.3602782781, 22.7785576135))
            ThreePointArc((-48.3602782781, 22.7785576135), (-48.3191339173, 22.9335455669), (-48.2583325799, 23.081927916))
            ThreePointArc((-48.2583325799, 23.081927916), (-47.9650746778, 23.4077161342), (-47.5437250639, 23.5285576135))
            ThreePointArc((-47.5437250639, 23.5285576135), (-47.1223754499, 23.4077161342), (-46.8291175479, 23.081927916))
            ThreePointArc((-46.8291175479, 23.081927916), (-46.7683162105, 22.9335455669), (-46.7271718496, 22.7785576135))
            Line((-46.7271718496, 22.7785576135), (-46.5437250639, 22.7785576135))
            Line((-46.5437250639, 22.7785576135), (-46.3602782781, 22.7785576135))
            ThreePointArc((-46.3602782781, 22.7785576135), (-46.3191339173, 22.9335455669), (-46.2583325799, 23.081927916))
            ThreePointArc((-46.2583325799, 23.081927916), (-45.9650746778, 23.4077161342), (-45.5437250639, 23.5285576135))
            ThreePointArc((-45.5437250639, 23.5285576135), (-45.1223754499, 23.4077161342), (-44.8291175479, 23.081927916))
            ThreePointArc((-44.8291175479, 23.081927916), (-44.7683162105, 22.9335455669), (-44.7271718496, 22.7785576135))
            Line((-44.7271718496, 22.7785576135), (-44.5437250639, 22.7785576135))
            Line((-44.5437250639, 22.7785576135), (-44.3602782781, 22.7785576135))
            ThreePointArc((-44.3602782781, 22.7785576135), (-44.3191339173, 22.9335455669), (-44.2583325799, 23.081927916))
            ThreePointArc((-44.2583325799, 23.081927916), (-43.9650746778, 23.4077161342), (-43.5437250639, 23.5285576135))
            ThreePointArc((-43.5437250639, 23.5285576135), (-43.1223754499, 23.4077161342), (-42.8291175479, 23.081927916))
            ThreePointArc((-42.8291175479, 23.081927916), (-42.7683162105, 22.9335455669), (-42.7271718496, 22.7785576135))
            Line((-42.7271718496, 22.7785576135), (-42.5437250639, 22.7785576135))
            Line((-42.5437250639, 22.7785576135), (-42.3602782781, 22.7785576135))
            ThreePointArc((-42.3602782781, 22.7785576135), (-42.3191339173, 22.9335455669), (-42.2583325799, 23.081927916))
            ThreePointArc((-42.2583325799, 23.081927916), (-41.9650746778, 23.4077161342), (-41.5437250639, 23.5285576135))
            ThreePointArc((-41.5437250639, 23.5285576135), (-41.1223754499, 23.4077161342), (-40.8291175479, 23.081927916))
            ThreePointArc((-40.8291175479, 23.081927916), (-40.7683162105, 22.9335455669), (-40.7271718496, 22.7785576135))
            Line((-40.7271718496, 22.7785576135), (-40.5437250639, 22.7785576135))
            Line((-40.5437250639, 22.7785576135), (-40.3602782781, 22.7785576135))
            ThreePointArc((-40.3602782781, 22.7785576135), (-40.3191339173, 22.9335455669), (-40.2583325799, 23.081927916))
            ThreePointArc((-40.2583325799, 23.081927916), (-39.9650746778, 23.4077161342), (-39.5437250639, 23.5285576135))
            ThreePointArc((-39.5437250639, 23.5285576135), (-39.1223754499, 23.4077161342), (-38.8291175479, 23.081927916))
            ThreePointArc((-38.8291175479, 23.081927916), (-38.7683162105, 22.9335455669), (-38.7271718496, 22.7785576135))
            Line((-38.7271718496, 22.7785576135), (-38.5437250639, 22.7785576135))
            Line((-38.5437250639, 22.7785576135), (-38.5437250639, 30.388556752))
            Line((-38.5437250639, 30.388556752), (-48.5437250639, 30.388556752))
        make_face()
    extrude(amount=-F2_DEPTH)

    # F6 (through all)
    with Locations(Plane.YZ.offset(-38.5437250639)):
        with Locations((26.838556752, -3)):
            CounterBoreHole(F6_D / 2, F6_CBORE_D / 2, F6_CBORE_DEPTH)


solid = Compound([f1.part, f1b.part])
